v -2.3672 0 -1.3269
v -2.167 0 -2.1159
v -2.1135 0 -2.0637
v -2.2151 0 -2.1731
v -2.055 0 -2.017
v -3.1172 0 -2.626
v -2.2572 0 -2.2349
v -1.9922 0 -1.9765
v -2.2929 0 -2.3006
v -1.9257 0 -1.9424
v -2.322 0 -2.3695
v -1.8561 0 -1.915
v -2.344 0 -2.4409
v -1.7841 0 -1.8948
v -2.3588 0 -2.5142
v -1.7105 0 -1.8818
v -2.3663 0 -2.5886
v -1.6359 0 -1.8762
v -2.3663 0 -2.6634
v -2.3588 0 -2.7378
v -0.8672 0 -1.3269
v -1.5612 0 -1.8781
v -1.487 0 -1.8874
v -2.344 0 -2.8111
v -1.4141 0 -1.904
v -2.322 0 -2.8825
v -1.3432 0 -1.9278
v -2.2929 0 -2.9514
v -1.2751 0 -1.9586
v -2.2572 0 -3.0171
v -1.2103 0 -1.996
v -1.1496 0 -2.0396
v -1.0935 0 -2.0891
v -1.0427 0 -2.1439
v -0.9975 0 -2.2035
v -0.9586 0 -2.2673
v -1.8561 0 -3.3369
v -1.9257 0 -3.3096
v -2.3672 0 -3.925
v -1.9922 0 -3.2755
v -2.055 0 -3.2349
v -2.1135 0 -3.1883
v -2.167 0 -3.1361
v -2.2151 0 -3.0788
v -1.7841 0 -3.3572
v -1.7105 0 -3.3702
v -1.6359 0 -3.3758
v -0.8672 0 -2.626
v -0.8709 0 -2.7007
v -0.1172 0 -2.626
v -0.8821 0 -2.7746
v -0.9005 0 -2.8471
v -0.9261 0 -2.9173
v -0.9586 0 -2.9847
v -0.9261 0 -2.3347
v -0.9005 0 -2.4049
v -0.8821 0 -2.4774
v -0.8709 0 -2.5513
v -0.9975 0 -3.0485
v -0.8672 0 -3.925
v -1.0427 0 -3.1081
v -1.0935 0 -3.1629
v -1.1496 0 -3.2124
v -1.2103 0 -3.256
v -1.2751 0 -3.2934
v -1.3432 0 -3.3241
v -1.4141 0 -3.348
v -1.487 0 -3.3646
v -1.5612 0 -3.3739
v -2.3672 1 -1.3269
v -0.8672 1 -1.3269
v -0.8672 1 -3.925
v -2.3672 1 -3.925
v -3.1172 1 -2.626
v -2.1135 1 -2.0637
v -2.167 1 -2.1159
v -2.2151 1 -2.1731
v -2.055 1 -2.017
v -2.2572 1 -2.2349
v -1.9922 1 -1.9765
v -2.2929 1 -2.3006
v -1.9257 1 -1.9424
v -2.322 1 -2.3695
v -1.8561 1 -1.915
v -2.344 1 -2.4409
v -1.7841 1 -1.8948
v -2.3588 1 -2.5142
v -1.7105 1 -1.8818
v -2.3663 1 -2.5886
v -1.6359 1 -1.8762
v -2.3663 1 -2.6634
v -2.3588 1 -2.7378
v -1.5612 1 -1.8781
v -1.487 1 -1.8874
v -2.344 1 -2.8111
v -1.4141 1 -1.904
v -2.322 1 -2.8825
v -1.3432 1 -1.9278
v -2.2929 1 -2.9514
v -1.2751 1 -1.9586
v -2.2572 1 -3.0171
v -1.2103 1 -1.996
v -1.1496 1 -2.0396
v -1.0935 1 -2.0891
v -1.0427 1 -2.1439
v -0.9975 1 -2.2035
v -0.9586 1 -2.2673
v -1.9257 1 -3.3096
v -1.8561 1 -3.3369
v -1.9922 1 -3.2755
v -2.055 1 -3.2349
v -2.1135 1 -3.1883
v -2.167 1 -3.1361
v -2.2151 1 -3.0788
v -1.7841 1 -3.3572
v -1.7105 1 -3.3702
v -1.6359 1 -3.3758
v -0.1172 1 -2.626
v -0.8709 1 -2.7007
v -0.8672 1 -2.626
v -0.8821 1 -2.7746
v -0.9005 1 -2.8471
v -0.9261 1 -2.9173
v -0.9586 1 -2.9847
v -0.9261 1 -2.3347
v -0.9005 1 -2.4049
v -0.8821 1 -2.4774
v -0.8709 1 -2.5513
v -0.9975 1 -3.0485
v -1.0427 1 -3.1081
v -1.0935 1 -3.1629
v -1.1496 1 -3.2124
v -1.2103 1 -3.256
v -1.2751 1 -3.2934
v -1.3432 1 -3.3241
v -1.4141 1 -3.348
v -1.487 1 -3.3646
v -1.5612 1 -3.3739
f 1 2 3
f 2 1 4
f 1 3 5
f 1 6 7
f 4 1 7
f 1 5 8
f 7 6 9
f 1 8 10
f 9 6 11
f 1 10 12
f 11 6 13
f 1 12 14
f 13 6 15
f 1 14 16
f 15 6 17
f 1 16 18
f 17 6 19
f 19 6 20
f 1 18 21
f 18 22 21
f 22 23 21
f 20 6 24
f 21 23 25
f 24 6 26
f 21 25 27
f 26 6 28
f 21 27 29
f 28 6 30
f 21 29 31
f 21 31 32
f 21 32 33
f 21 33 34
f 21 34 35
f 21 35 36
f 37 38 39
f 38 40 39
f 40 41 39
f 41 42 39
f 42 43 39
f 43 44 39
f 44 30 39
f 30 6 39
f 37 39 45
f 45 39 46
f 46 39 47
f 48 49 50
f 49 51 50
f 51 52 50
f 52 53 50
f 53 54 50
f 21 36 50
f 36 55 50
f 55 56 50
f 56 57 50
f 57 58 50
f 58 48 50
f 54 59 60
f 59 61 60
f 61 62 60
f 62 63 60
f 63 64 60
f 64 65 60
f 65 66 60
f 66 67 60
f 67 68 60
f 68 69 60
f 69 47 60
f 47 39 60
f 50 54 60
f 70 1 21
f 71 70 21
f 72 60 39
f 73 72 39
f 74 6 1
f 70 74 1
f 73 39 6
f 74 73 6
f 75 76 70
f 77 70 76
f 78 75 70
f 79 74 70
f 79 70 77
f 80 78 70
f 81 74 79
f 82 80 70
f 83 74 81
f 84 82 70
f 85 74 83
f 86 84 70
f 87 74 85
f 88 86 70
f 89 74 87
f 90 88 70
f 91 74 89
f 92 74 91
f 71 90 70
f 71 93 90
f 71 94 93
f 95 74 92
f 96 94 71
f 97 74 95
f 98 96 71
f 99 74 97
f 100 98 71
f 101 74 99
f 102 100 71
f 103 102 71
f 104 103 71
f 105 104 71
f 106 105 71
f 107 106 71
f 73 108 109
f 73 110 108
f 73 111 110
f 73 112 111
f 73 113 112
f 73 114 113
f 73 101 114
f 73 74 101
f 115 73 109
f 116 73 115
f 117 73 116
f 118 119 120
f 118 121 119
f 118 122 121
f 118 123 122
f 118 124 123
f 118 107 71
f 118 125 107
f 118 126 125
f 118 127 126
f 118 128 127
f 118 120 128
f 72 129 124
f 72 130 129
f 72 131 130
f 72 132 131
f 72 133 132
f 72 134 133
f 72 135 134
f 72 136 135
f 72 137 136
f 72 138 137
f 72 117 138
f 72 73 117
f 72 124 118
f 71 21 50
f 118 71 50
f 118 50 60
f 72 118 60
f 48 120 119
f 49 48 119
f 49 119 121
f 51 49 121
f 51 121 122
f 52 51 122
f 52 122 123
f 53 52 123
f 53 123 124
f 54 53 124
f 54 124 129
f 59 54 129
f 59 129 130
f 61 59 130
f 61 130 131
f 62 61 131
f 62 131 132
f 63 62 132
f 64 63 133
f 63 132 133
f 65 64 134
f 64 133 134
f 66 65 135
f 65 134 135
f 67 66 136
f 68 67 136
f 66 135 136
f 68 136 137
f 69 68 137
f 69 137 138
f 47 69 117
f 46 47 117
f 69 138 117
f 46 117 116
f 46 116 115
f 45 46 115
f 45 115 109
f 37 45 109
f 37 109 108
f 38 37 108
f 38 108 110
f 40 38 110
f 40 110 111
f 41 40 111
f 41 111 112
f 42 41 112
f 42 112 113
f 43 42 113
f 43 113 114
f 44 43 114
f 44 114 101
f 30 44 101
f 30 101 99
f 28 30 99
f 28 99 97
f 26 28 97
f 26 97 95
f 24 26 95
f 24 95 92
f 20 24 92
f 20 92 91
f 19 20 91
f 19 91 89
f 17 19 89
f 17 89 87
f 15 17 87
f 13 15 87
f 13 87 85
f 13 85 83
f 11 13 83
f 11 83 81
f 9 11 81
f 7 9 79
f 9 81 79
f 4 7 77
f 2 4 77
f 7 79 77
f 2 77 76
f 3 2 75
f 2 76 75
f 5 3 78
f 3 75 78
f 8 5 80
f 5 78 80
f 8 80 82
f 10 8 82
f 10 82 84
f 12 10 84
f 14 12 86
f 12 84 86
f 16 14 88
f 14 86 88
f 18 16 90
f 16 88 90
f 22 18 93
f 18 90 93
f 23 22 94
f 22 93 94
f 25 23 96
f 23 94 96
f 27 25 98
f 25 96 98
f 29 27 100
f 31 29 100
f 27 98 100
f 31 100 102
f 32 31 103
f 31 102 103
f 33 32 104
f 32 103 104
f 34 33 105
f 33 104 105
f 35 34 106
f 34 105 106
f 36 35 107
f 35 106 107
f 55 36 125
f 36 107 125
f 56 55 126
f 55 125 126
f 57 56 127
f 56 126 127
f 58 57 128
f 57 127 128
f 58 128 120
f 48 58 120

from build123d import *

# Parameters (mm, degrees)
EXTRUDE_1_DEPTH     = 1
SKETCH_2_R          = 0.75
CUT_EXTRUDE_1_DEPTH = 2


with BuildPart() as part:
    # 草图1 → 凸台-拉伸1 (new body)
    with BuildSketch(Plane(origin=(0, 0, 0), x_dir=(1, 0, 0), z_dir=(0, 1, 0))):
        Polygon((-3.117219624, 2.625987541), (-2.367219624, 1.326949435), (-0.867219624, 1.326949435), (-0.117219624, 2.625987541), (-0.867219624, 3.925025646), (-2.367219624, 3.925025646), align=None)
    extrude(amount=EXTRUDE_1_DEPTH)

    # 草图2 → 切除-拉伸1 (cut)
    with BuildSketch(Plane(origin=(0, 1, 0), x_dir=(1, 0, 0), z_dir=(0, 1, 0))):
        with Locations((-1.617219624, 2.625987541)):
            Circle(SKETCH_2_R)
    extrude(amount=-CUT_EXTRUDE_1_DEPTH, mode=Mode.SUBTRACT)


solid = part.part
